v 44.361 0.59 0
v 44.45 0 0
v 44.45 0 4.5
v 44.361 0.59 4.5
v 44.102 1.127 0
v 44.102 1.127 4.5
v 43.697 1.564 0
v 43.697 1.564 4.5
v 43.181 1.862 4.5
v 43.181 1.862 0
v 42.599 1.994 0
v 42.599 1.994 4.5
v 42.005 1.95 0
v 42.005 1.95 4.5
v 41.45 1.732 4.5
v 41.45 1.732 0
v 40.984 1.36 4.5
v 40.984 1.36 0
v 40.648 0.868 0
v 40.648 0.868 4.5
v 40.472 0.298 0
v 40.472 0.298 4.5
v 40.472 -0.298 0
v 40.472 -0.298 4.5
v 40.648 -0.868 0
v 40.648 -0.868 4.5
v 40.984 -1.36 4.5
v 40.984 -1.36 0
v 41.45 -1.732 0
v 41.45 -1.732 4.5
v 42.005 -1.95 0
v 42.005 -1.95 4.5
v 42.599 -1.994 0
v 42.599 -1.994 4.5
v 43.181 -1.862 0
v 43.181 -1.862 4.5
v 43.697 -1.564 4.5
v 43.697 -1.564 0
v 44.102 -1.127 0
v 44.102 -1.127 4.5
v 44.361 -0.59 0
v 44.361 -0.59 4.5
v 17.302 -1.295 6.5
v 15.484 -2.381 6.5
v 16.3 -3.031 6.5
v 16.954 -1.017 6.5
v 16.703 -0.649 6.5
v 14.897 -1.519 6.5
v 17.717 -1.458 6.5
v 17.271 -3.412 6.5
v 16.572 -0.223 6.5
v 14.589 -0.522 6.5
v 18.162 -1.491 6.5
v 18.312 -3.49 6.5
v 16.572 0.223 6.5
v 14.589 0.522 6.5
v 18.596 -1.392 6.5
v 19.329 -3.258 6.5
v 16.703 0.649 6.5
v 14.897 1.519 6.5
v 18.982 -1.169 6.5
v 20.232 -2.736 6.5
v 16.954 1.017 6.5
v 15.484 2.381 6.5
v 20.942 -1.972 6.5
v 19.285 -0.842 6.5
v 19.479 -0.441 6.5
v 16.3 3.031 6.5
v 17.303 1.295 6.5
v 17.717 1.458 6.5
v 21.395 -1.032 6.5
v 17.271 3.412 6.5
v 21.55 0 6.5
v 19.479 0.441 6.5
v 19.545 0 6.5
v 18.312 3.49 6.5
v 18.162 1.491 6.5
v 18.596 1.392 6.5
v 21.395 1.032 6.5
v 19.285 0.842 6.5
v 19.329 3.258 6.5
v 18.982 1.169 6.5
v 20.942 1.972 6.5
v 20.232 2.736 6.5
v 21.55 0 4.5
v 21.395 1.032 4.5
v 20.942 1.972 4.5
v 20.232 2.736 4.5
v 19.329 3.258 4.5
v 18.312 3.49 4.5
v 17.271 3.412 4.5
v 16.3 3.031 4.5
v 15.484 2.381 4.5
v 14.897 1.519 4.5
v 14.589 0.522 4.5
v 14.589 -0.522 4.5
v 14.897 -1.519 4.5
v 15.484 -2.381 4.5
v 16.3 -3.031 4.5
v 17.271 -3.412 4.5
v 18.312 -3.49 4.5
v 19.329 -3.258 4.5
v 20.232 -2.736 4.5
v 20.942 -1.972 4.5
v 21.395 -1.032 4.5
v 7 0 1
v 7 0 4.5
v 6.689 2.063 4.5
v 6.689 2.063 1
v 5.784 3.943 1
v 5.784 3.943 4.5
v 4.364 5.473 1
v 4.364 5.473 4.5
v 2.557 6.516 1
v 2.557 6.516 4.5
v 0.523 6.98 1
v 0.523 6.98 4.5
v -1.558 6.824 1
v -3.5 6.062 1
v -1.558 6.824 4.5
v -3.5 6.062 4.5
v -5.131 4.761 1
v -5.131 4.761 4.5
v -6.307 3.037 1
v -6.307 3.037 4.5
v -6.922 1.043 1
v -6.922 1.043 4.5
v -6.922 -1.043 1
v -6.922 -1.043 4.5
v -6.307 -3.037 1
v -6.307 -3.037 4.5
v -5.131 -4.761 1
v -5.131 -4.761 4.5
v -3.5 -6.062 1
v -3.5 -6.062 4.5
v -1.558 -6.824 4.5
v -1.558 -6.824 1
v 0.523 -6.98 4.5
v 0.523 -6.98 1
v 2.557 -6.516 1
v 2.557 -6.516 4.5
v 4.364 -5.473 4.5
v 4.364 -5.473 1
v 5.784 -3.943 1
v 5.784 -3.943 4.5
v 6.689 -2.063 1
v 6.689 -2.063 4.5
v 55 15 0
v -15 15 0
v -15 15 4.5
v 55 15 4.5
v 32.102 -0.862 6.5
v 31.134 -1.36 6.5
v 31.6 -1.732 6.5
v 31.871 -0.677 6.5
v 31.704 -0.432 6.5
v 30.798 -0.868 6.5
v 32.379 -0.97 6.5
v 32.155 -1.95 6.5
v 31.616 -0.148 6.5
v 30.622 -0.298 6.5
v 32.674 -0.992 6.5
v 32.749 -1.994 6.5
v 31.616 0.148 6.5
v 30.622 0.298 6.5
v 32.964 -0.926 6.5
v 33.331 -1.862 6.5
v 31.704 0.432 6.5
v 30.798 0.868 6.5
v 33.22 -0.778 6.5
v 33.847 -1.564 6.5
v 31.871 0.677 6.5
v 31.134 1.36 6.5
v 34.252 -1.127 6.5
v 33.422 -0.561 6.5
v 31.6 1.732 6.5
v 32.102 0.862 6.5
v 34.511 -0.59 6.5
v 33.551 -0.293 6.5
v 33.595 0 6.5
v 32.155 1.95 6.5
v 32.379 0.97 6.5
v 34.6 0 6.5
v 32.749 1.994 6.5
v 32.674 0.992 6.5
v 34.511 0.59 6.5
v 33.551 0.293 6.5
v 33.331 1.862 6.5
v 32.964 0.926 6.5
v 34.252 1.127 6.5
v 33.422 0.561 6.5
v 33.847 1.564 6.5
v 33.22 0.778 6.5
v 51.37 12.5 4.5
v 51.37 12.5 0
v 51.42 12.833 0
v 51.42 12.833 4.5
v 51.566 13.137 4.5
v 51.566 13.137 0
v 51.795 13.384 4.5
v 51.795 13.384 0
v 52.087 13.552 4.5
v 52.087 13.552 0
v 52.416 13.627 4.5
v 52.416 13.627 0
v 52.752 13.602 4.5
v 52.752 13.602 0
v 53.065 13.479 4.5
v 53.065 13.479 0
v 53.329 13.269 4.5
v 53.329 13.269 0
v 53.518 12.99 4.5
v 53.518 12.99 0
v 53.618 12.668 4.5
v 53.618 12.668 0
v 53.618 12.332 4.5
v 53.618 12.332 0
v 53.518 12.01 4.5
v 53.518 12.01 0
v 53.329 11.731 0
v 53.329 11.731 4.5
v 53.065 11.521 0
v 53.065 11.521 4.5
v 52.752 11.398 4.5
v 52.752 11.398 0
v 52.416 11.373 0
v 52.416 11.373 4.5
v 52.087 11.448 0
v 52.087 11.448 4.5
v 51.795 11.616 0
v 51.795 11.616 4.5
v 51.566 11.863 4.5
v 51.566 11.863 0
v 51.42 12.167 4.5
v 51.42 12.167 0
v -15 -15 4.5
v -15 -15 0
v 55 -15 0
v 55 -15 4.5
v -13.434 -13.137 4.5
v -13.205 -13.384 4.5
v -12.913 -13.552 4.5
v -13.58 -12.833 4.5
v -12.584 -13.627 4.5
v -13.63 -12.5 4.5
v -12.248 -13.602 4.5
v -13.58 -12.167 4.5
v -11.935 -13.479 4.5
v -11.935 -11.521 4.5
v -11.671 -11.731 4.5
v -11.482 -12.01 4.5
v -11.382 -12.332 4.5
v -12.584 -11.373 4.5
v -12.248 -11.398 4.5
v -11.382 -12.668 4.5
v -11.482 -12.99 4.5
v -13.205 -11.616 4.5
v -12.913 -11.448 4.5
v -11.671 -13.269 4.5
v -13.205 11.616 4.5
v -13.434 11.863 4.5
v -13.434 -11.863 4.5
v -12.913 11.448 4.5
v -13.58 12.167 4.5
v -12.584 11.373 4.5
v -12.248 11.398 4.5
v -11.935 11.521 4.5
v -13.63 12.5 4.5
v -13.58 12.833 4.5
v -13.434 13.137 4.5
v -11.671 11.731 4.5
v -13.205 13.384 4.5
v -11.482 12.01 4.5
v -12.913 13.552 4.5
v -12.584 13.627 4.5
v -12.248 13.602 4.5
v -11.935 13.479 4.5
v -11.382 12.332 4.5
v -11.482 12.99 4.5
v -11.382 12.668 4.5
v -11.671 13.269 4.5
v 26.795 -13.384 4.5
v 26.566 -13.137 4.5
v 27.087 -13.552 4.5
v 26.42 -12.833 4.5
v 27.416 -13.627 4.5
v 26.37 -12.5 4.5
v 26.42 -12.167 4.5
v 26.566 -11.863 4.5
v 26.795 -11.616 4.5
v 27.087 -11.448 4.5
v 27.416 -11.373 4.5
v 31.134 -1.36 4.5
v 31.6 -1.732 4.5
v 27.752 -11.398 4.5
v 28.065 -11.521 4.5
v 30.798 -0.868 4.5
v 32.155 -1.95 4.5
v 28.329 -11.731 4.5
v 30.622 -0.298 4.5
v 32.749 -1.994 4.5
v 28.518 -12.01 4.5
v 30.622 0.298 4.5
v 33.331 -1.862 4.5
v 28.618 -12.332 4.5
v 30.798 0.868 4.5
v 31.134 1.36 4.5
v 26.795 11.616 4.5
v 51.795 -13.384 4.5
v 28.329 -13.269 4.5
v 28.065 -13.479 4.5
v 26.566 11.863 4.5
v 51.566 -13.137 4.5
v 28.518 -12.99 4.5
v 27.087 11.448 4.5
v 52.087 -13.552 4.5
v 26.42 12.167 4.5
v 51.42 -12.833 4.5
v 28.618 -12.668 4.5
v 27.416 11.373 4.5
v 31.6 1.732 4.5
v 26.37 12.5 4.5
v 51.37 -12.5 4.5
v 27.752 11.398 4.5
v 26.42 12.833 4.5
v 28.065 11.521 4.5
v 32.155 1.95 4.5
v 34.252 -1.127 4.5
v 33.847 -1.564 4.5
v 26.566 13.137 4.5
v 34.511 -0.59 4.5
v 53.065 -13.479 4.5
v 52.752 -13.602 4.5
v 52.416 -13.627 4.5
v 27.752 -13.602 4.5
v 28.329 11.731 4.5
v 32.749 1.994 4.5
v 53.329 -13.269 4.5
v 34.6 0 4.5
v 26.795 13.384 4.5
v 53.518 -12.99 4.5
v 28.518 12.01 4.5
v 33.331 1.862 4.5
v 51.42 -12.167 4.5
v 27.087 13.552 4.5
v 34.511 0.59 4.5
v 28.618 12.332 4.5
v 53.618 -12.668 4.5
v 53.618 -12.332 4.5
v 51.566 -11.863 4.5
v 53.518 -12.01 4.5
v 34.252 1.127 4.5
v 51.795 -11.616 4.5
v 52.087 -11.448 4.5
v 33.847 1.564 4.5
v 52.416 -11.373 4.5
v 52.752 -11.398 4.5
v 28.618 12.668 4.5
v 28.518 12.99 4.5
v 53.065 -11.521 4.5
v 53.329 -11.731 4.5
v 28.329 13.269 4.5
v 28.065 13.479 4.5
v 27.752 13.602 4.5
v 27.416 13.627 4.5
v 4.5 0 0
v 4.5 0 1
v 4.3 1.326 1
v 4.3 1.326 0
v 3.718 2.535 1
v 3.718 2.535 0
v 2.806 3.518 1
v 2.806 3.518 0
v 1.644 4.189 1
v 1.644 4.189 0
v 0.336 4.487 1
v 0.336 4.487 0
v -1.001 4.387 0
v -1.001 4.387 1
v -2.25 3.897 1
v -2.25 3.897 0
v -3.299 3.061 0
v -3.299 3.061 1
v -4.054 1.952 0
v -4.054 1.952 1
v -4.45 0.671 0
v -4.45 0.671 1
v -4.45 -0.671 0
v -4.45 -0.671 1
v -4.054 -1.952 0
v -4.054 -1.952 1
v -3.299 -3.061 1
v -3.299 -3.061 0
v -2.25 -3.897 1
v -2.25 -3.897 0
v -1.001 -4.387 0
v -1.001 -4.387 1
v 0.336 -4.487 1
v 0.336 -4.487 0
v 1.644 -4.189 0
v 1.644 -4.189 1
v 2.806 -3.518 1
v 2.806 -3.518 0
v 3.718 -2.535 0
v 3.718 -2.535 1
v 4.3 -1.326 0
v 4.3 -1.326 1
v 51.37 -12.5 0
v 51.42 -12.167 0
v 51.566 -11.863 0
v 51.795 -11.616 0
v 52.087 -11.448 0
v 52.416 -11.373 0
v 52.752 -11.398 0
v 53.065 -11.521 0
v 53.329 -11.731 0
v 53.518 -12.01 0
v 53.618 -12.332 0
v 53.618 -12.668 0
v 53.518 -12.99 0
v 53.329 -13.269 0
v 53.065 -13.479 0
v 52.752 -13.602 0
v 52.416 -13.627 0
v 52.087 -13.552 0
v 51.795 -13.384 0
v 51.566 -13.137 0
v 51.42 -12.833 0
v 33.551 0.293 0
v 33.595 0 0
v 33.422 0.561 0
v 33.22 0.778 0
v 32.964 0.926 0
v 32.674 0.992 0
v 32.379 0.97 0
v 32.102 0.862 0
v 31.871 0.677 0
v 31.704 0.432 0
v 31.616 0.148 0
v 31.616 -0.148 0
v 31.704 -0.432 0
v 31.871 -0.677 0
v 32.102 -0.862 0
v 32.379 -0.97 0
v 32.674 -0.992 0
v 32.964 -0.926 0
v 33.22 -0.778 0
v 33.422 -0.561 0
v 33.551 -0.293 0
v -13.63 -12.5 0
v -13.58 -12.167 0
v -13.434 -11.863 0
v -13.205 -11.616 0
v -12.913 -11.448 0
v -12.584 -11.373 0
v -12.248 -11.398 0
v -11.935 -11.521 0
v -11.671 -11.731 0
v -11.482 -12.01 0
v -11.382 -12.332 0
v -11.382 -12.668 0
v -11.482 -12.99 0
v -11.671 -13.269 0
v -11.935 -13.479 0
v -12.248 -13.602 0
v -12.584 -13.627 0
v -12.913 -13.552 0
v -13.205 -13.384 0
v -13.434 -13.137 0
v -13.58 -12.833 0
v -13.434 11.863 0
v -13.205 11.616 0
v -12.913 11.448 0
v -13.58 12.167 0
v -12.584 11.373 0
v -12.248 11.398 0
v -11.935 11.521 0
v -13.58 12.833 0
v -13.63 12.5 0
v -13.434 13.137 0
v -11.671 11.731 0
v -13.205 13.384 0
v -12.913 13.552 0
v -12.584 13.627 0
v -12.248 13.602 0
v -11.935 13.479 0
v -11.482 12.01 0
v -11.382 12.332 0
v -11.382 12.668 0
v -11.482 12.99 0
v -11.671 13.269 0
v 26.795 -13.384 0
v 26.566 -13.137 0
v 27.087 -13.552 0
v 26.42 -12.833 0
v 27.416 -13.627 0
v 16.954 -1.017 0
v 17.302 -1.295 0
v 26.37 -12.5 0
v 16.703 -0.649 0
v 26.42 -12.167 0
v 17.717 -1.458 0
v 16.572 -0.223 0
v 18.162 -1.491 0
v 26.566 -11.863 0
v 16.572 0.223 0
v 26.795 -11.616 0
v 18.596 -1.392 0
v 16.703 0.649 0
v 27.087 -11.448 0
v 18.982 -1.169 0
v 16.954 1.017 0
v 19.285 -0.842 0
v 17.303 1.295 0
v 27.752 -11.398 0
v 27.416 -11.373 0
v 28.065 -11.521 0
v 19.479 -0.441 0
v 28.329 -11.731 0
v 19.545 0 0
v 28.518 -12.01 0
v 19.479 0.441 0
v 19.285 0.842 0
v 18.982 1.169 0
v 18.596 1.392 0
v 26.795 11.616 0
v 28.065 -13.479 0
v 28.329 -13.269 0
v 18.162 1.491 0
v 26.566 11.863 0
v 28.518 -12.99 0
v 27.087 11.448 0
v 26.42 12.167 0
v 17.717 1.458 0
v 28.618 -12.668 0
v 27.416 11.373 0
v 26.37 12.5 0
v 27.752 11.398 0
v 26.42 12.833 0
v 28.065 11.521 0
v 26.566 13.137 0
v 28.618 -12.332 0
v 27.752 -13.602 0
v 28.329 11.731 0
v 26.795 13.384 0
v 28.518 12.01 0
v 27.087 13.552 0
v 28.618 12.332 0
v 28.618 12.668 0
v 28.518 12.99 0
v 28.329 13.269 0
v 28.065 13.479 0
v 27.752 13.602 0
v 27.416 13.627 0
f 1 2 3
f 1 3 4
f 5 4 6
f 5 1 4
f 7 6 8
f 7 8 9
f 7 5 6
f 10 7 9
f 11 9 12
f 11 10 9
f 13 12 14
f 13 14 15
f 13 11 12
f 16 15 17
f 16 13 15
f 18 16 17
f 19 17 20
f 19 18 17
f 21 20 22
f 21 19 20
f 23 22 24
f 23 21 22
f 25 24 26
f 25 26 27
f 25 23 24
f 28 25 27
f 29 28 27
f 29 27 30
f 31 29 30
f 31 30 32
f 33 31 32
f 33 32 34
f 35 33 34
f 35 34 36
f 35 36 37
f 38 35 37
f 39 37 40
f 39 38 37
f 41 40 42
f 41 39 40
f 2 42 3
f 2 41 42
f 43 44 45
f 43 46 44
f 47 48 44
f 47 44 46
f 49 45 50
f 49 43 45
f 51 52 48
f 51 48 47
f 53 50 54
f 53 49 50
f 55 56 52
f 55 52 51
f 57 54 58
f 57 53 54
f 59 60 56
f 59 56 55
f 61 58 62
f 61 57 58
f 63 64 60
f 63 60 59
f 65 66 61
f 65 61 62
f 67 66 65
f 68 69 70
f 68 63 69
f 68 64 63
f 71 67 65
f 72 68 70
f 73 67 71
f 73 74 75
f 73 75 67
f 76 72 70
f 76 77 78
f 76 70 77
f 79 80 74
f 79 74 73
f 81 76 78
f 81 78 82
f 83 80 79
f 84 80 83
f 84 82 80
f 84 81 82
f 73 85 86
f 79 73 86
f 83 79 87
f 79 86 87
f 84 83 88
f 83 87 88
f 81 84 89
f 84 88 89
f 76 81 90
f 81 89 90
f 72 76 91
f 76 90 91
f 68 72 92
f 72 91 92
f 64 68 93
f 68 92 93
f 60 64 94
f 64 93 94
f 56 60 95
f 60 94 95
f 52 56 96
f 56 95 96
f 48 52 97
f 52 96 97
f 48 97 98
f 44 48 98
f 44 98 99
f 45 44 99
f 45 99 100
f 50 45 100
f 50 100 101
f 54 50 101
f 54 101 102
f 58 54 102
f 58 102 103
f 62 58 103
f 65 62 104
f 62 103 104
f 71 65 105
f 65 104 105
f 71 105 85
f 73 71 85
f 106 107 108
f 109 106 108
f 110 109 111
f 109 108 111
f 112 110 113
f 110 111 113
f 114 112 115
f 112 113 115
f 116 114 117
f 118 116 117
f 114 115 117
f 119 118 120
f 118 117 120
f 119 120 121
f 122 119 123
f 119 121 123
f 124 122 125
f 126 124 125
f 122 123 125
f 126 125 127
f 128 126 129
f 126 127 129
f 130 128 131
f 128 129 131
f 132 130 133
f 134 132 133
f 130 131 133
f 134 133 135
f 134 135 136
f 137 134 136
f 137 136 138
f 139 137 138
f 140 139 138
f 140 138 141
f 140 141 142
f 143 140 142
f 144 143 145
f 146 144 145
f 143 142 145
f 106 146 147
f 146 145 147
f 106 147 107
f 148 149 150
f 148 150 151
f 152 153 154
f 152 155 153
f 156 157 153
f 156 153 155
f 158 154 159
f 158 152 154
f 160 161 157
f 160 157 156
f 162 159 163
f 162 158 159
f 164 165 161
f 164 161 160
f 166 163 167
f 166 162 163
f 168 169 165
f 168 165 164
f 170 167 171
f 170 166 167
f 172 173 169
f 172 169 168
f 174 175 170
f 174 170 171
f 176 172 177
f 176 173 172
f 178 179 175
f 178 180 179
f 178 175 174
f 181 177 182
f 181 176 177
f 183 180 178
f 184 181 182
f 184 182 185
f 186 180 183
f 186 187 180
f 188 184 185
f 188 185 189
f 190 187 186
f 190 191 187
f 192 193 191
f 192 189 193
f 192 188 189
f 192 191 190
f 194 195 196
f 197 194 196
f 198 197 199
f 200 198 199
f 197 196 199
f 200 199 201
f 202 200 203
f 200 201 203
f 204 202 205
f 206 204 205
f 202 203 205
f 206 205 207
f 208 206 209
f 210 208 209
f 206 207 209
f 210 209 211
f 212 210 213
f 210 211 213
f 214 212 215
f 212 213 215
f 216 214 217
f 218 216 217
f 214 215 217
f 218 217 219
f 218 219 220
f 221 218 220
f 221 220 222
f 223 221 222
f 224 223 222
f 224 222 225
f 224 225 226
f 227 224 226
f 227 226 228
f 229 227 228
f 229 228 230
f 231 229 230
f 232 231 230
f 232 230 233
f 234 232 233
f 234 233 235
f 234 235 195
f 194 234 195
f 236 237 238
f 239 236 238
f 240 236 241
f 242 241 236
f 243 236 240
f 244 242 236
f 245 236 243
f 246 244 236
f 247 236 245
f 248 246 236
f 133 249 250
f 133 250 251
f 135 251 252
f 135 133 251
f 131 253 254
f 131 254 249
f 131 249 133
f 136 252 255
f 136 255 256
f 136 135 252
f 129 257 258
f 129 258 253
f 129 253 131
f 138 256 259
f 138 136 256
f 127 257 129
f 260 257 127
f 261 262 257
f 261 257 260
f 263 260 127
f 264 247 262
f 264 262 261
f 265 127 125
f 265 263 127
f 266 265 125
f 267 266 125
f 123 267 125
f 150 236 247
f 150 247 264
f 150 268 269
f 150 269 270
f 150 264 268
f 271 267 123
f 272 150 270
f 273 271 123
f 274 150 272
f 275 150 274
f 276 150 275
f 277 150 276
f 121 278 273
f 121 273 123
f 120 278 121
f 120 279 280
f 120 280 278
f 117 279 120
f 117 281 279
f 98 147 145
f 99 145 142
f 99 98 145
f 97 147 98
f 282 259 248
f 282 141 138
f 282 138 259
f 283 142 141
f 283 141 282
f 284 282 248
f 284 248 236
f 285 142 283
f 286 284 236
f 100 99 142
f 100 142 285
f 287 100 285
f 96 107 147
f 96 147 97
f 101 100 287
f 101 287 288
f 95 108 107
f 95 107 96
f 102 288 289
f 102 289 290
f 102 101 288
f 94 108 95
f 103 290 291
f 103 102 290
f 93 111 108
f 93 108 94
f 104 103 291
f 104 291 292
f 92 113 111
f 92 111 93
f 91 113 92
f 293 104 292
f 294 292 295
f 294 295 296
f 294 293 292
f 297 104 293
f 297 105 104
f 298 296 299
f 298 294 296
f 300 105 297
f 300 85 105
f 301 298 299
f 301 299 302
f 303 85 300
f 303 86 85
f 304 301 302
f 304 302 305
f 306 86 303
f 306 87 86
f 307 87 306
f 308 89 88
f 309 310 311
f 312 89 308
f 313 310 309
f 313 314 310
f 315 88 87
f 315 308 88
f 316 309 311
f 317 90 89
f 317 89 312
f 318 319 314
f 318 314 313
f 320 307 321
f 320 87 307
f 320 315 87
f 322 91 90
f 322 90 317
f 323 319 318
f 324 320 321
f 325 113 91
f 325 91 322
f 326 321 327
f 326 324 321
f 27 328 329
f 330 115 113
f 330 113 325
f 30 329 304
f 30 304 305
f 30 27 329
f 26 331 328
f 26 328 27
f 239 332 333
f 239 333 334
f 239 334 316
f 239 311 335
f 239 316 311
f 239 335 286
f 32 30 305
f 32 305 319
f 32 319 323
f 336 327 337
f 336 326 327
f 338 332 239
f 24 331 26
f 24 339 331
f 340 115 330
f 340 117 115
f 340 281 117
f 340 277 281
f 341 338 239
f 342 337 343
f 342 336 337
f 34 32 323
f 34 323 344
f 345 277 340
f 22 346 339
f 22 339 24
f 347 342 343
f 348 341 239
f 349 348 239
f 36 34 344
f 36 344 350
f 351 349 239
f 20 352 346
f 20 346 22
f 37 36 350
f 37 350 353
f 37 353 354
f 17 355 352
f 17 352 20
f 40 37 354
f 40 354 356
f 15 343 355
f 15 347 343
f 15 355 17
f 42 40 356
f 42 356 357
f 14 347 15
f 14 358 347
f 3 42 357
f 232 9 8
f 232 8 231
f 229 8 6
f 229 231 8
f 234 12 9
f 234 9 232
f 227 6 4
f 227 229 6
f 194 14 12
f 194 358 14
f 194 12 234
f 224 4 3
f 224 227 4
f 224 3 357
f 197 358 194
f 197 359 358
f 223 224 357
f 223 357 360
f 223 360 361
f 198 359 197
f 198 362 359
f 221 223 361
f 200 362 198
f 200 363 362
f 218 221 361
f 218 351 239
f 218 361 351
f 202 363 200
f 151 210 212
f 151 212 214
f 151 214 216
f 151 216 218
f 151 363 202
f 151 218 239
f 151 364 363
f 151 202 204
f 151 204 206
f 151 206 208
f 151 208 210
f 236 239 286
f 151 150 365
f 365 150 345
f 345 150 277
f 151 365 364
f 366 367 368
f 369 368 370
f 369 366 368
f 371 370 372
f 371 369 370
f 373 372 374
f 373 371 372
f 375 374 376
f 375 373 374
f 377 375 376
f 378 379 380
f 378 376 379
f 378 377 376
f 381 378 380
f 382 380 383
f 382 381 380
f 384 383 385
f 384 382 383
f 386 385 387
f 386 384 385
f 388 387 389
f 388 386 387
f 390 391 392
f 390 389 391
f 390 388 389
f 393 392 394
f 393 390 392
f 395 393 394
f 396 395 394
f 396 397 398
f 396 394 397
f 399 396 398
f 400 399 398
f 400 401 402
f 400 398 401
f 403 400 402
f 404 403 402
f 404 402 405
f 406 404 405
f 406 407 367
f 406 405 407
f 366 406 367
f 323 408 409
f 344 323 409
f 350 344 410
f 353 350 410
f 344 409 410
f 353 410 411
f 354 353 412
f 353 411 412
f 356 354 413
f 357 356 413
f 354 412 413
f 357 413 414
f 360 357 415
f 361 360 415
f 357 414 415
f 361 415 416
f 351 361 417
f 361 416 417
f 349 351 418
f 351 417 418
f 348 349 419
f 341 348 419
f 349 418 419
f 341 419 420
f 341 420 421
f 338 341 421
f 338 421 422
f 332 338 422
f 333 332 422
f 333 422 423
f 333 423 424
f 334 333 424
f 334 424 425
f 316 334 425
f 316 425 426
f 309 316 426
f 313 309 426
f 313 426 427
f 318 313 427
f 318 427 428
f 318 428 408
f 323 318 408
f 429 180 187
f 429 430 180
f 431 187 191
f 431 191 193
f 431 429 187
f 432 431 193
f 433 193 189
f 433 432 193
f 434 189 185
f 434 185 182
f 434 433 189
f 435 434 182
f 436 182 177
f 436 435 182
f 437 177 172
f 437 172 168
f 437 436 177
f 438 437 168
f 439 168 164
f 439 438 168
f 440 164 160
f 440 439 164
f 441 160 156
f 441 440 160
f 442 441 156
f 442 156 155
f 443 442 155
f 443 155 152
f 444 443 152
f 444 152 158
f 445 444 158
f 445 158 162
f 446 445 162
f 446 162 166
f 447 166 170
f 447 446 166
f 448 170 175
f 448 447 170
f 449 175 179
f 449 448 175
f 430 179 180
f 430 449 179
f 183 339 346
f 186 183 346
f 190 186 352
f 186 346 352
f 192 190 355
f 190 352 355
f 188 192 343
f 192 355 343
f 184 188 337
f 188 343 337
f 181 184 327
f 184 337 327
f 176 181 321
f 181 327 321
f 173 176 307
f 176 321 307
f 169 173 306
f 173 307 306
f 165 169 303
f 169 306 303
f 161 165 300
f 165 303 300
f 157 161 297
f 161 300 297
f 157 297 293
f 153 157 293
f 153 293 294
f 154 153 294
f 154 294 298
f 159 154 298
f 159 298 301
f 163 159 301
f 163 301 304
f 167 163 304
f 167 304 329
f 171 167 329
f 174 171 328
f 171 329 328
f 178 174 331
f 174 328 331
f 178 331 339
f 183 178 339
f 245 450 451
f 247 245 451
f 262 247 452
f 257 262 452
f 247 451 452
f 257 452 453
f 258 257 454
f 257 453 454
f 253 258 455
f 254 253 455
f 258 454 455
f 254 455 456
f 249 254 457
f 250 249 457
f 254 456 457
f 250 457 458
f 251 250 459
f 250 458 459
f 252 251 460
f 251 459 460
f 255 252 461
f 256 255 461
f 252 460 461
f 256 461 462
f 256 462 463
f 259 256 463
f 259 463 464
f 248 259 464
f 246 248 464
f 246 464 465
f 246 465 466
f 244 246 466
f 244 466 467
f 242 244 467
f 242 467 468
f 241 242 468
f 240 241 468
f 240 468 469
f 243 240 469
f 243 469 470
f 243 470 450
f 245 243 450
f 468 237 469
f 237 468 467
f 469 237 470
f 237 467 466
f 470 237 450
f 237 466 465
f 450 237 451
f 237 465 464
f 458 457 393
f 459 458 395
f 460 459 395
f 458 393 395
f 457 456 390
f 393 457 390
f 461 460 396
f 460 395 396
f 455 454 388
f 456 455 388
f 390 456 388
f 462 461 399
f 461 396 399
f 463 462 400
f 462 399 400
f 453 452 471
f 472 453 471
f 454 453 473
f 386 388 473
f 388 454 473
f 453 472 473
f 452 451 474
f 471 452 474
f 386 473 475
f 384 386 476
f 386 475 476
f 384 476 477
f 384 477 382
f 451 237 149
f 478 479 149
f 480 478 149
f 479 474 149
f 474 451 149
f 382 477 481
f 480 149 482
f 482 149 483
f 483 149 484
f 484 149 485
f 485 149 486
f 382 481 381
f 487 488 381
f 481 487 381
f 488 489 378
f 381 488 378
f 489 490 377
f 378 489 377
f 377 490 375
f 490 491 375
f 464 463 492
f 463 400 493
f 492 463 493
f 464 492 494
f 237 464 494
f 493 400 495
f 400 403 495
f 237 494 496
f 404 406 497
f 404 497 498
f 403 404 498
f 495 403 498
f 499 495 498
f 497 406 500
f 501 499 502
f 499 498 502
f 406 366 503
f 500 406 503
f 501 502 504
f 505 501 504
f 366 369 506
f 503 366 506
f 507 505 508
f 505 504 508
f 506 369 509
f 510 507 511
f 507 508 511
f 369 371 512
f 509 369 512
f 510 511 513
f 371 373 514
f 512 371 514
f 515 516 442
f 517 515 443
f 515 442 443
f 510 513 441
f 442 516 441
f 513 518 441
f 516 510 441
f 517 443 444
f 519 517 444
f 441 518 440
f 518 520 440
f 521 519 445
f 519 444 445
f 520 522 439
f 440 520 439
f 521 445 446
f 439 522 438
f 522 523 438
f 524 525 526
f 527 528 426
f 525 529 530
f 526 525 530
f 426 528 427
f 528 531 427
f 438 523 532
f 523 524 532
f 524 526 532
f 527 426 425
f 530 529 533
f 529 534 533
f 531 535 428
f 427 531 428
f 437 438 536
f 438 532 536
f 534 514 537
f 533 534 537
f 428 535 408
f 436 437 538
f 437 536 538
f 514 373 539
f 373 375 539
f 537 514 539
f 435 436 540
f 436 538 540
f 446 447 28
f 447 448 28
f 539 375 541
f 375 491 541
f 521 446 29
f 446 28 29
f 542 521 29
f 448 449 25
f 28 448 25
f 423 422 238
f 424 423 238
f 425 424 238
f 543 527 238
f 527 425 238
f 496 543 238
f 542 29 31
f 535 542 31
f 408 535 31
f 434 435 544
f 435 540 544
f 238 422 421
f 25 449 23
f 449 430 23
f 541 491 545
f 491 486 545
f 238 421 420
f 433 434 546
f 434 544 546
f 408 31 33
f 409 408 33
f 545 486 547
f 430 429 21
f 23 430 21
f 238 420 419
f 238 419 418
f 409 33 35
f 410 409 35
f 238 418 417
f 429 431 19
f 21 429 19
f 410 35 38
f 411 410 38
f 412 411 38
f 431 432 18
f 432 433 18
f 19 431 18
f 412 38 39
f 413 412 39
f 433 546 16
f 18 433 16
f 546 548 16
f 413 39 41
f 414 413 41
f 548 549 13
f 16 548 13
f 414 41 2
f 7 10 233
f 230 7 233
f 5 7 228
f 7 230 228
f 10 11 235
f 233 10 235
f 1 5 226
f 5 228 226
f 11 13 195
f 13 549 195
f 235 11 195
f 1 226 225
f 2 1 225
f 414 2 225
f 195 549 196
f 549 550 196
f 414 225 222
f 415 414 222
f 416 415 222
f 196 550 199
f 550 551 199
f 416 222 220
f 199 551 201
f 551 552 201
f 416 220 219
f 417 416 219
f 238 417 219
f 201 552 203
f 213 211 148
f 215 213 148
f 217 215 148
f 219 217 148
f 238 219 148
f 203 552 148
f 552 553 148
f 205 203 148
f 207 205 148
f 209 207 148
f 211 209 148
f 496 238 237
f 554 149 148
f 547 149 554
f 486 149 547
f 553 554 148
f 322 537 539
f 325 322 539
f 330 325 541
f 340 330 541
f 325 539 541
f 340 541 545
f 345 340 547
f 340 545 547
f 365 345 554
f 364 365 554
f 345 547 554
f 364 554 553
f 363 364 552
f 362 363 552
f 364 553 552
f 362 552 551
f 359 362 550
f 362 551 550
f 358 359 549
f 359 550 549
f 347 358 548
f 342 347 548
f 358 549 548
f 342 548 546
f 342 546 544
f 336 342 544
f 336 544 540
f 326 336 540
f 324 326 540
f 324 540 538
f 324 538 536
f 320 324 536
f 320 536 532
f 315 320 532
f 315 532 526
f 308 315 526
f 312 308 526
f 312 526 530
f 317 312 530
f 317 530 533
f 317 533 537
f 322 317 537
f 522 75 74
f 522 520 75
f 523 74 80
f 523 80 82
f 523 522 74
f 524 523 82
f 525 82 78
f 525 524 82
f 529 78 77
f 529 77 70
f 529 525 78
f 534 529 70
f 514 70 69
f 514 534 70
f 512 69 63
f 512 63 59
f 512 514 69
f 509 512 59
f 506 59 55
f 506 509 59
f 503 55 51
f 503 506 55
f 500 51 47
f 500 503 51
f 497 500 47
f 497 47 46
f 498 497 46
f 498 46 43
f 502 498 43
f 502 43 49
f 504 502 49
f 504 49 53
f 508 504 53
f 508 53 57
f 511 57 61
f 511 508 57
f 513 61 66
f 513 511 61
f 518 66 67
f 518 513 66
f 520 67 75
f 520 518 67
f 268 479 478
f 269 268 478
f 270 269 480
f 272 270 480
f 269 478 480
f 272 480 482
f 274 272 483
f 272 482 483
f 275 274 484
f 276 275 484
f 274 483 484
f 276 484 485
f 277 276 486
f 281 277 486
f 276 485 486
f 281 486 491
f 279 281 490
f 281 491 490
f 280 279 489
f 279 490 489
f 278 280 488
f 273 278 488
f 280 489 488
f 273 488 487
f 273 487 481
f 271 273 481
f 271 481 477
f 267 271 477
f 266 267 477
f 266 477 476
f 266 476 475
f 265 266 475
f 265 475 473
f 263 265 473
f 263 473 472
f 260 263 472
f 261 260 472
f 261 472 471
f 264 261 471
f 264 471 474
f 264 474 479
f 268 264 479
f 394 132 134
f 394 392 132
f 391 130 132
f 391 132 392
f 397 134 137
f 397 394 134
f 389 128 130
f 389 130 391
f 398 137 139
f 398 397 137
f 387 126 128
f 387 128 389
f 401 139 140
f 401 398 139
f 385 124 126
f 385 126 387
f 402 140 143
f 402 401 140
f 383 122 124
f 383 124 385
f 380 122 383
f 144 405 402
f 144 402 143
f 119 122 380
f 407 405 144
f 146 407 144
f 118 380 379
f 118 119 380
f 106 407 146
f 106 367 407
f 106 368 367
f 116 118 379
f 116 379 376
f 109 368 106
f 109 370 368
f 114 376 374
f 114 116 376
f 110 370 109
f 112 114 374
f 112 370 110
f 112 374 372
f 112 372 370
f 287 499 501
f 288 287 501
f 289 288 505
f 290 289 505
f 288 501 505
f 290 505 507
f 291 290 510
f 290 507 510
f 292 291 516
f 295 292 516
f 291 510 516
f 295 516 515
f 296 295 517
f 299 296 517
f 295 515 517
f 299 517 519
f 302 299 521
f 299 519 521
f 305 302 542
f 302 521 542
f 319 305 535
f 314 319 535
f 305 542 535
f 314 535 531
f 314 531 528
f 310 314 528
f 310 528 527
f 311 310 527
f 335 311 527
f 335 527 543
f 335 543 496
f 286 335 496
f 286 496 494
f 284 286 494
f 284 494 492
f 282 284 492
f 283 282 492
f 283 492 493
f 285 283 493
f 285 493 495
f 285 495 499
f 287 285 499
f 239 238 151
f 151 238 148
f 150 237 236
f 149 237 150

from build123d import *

# Parameters (mm, degrees)
SKETCH1_W             = 70
SKETCH1_H             = 30
SKETCH1_R             = 4.5
SKETCH1_R_2           = 1.495
SKETCH1_R_3           = 0.995
SKETCH1_R_4           = 2
BOSS_EXTRUDE1_DEPTH   = 4.5
F_2_CLEARANCE_HOLE1_D = 2.2606
SKETCH6_R             = 7
CUT_EXTRUDE1_DEPTH    = 3.5
SKETCH7_R             = 3.5
SKETCH7_R_2           = 1.495
BOSS_EXTRUDE2_DEPTH   = 2
SKETCH8_R             = 2
SKETCH8_R_2           = 0.995
BOSS_EXTRUDE3_DEPTH   = 2


with BuildPart() as part:
    # Sketch1 → Boss-Extrude1 (new body)
    with BuildSketch(Plane.XY):
        with Locations((20, 0)):
            Rectangle(SKETCH1_W, SKETCH1_H)
        Circle(SKETCH1_R, mode=Mode.SUBTRACT)
        with Locations((18.05, 0)):
            Circle(SKETCH1_R_2, mode=Mode.SUBTRACT)
        with Locations((32.6, 0)):
            Circle(SKETCH1_R_3, mode=Mode.SUBTRACT)
        with Locations((42.449999958, 0)):
            Circle(SKETCH1_R_4, mode=Mode.SUBTRACT)
    extrude(amount=BOSS_EXTRUDE1_DEPTH)

    # #2 Clearance Hole1 (through all)
    with Locations(Plane.XY.offset(4.5)):
        with Locations((-12.5, 12.5), (-12.5, -12.5), (27.5, 12.5), (27.5, -12.5), (52.5, 12.5), (52.5, -12.5)):
            Hole(F_2_CLEARANCE_HOLE1_D / 2)

    # Sketch6 → Cut-Extrude1 (cut)
    with BuildSketch(Plane.XY.offset(4.5)):
        Circle(SKETCH6_R)
    extrude(amount=-CUT_EXTRUDE1_DEPTH, mode=Mode.SUBTRACT)

    # Sketch7 → Boss-Extrude2 (add)
    with BuildSketch(Plane.XY.offset(4.5)):
        with Locations((18.05, 0)):
            Circle(SKETCH7_R)
        with Locations((18.05, 0)):
            Circle(SKETCH7_R_2, mode=Mode.SUBTRACT)
    extrude(amount=BOSS_EXTRUDE2_DEPTH)

    # Sketch8 → Boss-Extrude3 (add)
    with BuildSketch(Plane.XY.offset(4.5)):
        with Locations((32.6, 0)):
            Circle(SKETCH8_R)
        with Locations((32.6, 0)):
            Circle(SKETCH8_R_2, mode=Mode.SUBTRACT)
    extrude(amount=BOSS_EXTRUDE3_DEPTH)


solid = part.part
